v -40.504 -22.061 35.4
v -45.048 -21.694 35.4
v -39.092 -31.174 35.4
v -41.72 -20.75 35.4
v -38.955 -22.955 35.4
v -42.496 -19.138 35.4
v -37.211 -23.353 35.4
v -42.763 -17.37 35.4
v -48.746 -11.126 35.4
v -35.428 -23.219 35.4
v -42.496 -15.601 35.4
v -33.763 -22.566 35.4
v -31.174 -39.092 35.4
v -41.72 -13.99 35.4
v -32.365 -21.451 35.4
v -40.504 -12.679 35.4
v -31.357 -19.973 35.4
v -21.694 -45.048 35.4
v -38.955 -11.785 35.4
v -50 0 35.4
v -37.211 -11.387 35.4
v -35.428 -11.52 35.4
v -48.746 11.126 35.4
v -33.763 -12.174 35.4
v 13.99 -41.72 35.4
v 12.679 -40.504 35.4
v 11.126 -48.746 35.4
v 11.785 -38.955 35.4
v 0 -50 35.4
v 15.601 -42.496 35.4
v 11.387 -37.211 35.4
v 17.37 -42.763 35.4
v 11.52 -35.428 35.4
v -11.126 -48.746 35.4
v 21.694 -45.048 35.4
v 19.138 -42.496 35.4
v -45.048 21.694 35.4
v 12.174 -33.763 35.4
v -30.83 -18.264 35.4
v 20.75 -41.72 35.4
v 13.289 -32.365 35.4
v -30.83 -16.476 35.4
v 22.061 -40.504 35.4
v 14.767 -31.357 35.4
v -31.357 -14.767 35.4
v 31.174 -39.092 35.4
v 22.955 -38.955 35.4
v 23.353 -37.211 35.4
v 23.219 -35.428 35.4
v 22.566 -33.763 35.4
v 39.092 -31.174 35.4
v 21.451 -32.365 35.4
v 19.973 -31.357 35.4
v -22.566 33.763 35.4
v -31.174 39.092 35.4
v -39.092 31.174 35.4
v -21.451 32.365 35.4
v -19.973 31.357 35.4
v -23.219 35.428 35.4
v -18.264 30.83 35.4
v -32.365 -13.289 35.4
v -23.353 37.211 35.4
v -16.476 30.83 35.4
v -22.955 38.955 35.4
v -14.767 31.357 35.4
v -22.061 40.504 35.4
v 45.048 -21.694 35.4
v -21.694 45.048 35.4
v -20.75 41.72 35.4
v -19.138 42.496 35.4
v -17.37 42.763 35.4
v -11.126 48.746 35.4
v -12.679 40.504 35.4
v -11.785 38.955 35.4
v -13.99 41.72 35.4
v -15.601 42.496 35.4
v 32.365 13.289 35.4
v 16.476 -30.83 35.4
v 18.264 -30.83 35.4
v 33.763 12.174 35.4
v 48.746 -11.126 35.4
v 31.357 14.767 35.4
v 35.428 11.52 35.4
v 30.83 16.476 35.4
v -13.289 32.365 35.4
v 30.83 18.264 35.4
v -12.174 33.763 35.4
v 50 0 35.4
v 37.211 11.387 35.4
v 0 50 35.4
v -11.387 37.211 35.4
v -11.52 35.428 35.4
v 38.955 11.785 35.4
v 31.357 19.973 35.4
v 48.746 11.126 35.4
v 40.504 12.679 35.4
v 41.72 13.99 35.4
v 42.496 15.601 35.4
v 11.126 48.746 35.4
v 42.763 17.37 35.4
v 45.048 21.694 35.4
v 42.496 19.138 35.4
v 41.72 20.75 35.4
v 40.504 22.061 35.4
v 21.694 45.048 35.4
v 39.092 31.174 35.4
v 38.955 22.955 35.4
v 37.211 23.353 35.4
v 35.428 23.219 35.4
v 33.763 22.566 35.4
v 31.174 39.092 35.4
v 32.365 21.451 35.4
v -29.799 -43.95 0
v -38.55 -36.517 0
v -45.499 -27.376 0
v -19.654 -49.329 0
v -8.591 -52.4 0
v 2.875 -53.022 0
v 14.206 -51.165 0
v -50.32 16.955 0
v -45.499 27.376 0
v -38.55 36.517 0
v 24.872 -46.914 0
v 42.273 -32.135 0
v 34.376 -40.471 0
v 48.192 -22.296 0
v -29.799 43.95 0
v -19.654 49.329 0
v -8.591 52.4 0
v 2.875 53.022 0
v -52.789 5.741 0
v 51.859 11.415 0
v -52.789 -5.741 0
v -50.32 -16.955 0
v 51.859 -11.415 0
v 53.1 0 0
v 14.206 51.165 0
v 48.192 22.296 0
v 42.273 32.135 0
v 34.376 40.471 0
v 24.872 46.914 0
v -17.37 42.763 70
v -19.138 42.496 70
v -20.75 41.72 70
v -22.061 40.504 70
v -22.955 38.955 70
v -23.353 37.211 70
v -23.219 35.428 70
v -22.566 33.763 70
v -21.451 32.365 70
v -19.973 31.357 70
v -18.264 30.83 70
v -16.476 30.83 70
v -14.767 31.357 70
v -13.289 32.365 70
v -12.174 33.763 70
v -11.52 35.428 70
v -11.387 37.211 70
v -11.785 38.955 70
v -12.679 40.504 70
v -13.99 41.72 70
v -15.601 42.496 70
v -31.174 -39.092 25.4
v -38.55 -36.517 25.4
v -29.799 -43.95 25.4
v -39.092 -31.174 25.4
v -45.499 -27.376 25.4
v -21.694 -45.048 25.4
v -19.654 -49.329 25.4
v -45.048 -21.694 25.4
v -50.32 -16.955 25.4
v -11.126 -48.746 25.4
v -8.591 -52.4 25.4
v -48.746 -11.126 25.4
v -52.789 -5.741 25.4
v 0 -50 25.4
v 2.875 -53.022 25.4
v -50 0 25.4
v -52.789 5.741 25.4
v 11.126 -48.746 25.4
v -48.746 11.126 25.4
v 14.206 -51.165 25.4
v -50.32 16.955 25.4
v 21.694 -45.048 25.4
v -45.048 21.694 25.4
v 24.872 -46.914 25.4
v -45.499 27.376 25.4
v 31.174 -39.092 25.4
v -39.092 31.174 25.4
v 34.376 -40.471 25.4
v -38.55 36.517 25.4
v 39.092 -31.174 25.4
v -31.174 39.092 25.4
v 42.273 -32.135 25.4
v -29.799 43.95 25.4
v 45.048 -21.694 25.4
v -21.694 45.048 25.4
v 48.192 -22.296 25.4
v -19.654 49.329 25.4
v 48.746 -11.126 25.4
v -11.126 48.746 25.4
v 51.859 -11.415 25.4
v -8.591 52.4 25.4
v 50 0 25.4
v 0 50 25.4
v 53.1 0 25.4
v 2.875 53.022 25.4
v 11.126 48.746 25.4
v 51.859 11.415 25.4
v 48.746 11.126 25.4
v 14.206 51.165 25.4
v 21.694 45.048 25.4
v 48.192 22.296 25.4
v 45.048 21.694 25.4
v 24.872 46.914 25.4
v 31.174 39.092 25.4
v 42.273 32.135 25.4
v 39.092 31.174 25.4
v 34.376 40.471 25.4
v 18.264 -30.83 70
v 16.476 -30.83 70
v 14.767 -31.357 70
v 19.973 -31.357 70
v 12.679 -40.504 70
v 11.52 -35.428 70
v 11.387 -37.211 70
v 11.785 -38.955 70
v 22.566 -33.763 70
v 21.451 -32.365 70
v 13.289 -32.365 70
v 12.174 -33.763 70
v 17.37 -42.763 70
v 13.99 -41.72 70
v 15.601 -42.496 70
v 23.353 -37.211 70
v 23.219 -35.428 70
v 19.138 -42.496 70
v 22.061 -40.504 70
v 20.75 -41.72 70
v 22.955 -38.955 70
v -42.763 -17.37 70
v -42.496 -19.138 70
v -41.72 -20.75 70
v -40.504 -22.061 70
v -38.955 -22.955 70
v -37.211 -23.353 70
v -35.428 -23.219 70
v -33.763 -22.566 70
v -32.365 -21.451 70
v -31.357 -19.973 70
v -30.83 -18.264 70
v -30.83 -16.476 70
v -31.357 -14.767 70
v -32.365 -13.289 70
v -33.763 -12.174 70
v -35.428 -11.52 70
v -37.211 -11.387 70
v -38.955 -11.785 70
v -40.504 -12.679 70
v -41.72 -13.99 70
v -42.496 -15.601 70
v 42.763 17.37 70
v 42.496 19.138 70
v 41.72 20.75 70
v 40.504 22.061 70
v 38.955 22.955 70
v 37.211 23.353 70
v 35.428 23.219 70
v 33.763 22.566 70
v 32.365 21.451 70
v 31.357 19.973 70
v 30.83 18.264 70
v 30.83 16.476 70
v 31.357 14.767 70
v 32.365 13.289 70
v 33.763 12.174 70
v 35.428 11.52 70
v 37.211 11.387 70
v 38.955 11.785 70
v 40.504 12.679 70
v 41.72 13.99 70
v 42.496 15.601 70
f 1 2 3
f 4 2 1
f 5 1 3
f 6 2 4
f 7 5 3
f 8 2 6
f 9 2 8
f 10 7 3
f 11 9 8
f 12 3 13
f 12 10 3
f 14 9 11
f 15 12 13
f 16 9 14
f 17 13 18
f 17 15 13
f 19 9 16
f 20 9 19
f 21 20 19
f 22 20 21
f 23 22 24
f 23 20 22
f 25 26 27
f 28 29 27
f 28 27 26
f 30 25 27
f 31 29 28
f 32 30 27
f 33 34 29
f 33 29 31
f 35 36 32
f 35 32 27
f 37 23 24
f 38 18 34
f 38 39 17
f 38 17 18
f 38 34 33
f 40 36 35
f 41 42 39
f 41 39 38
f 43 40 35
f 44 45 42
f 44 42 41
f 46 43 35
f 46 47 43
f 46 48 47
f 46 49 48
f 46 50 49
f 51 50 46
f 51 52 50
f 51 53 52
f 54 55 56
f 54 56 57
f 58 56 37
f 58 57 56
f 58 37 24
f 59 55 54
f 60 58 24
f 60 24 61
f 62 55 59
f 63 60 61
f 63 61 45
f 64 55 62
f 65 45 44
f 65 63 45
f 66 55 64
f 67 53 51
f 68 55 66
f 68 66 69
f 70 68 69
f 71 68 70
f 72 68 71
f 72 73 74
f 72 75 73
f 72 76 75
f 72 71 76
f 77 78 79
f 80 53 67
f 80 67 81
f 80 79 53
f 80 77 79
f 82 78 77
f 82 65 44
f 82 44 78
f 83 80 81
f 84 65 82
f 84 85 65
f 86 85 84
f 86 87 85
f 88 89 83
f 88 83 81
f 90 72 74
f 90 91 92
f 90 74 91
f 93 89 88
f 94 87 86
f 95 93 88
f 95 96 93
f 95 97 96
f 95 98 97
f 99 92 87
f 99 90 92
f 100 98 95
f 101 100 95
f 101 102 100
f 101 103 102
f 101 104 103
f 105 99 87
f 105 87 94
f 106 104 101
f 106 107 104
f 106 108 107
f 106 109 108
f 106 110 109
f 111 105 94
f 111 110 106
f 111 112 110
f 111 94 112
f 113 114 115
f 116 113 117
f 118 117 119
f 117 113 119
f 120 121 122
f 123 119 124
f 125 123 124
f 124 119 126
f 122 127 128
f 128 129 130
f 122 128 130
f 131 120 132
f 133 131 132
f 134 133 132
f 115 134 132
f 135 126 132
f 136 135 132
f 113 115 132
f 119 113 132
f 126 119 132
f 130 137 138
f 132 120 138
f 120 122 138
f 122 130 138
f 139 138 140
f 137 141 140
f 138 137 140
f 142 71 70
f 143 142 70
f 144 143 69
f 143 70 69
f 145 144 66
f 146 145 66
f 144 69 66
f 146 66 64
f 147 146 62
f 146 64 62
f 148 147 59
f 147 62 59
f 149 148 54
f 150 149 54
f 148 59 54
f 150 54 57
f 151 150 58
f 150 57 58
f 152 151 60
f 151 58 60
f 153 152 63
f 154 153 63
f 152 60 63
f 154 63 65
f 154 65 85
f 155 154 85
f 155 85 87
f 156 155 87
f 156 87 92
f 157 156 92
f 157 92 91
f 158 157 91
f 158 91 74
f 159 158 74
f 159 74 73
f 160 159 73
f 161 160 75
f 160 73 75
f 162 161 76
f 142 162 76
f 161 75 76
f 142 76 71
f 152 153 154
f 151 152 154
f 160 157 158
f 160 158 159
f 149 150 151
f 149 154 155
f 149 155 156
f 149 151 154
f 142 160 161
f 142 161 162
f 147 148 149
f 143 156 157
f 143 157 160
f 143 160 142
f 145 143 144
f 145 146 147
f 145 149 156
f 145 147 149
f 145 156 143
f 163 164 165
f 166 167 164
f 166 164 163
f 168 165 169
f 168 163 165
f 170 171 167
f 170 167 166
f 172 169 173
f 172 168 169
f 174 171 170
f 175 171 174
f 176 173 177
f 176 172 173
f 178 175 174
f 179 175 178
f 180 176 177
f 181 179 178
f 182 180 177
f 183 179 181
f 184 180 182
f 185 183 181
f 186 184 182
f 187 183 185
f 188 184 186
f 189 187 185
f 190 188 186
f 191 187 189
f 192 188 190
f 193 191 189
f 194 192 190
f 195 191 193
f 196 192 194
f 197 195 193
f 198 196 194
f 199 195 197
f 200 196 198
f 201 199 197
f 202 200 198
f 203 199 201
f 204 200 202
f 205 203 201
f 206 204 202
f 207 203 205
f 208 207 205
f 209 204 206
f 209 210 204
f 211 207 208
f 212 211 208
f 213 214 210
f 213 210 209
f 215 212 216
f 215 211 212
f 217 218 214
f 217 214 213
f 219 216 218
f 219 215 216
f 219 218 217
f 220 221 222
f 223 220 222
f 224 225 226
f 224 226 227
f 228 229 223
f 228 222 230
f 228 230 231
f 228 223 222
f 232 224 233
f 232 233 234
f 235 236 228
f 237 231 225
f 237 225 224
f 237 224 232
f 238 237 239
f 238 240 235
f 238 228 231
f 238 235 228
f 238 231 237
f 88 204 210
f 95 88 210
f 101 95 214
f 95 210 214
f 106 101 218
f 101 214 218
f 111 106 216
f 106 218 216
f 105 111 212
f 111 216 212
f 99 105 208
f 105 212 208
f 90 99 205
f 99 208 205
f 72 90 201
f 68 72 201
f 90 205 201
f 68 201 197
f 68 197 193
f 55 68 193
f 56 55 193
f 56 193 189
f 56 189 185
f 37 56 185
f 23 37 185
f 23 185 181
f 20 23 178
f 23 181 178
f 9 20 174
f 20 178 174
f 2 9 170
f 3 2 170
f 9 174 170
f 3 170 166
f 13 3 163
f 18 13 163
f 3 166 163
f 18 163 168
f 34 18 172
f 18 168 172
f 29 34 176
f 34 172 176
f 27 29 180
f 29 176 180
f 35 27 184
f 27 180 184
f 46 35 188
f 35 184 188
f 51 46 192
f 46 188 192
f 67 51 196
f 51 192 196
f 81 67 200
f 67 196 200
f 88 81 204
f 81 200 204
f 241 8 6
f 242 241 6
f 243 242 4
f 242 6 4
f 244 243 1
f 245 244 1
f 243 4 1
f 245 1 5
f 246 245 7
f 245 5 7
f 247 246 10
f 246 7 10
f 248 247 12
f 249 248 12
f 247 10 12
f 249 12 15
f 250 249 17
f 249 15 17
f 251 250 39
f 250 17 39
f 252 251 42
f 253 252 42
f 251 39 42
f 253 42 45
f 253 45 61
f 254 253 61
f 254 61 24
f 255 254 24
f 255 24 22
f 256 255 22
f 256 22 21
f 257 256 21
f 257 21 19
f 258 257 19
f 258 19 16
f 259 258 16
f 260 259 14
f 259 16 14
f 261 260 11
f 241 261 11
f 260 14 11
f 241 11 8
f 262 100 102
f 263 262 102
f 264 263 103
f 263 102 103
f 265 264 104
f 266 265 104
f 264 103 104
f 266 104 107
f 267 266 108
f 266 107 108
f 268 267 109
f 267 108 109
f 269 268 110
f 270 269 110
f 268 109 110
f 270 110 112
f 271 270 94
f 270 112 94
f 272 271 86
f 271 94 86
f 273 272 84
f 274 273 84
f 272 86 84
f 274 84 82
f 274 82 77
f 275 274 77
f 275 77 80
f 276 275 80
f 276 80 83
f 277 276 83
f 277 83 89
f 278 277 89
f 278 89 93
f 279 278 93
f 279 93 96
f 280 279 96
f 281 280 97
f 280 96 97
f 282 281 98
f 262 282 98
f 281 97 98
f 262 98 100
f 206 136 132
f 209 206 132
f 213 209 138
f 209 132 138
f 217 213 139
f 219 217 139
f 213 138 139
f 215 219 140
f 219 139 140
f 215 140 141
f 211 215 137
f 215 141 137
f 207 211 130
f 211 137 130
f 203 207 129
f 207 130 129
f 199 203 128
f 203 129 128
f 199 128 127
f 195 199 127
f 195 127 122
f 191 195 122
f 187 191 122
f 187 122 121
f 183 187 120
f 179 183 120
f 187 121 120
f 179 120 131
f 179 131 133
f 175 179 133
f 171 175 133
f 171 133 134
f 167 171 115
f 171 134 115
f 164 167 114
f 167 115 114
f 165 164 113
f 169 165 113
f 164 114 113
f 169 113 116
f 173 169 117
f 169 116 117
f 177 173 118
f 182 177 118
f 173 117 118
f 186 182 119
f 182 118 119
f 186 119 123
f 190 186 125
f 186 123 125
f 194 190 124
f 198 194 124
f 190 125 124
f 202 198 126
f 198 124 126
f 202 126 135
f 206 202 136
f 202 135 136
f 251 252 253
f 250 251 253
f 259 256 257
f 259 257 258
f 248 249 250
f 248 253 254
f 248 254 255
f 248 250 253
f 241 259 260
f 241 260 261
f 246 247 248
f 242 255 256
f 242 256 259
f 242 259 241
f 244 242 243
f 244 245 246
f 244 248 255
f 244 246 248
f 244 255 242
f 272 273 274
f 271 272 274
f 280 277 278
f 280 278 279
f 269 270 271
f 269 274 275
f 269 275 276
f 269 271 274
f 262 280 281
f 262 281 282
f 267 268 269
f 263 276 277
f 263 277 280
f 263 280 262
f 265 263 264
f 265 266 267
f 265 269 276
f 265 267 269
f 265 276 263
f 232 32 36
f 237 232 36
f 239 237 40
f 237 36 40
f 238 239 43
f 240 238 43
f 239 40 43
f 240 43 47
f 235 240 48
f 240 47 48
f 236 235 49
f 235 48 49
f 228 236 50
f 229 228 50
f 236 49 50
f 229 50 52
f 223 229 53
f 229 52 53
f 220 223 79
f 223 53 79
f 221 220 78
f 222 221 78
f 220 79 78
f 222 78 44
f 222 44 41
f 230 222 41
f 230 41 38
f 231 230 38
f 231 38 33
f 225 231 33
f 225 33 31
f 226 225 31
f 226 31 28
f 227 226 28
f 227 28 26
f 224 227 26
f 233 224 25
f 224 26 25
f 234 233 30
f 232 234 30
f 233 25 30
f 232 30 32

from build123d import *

# Parameters (mm, degrees)
ESQUISSE1_R                  = 53.1
BOSS_EXTRU_1_DEPTH           = 25.4
ESQUISSE2_R                  = 50
BOSS_EXTRU_2_DEPTH           = 10
ESQUISSE3_R                  = 6
BOSS_EXTRU_3_DEPTH           = 34.6
R_P_TITION_CIRCULAIRE1_COUNT = 4


with BuildPart() as part:
    # Esquisse1 → Boss.-Extru.1 (new body)
    with BuildSketch(Plane.XY):
        Circle(ESQUISSE1_R)
    extrude(amount=BOSS_EXTRU_1_DEPTH)

    # Esquisse2 → Boss.-Extru.2 (add)
    with BuildSketch(Plane.XY.offset(25.4)):
        Circle(ESQUISSE2_R)
    extrude(amount=BOSS_EXTRU_2_DEPTH)

    # Esquisse3 → Boss.-Extru.3 (add)
    with BuildSketch(Plane.XY.offset(35.4)):
        with Locations((36.76305328, 17.369902519)):
            Circle(ESQUISSE3_R)
    boss_extru_3 = extrude(amount=BOSS_EXTRU_3_DEPTH)

    # Répétition circulaire1: Boss.-Extru.3 ×4 about axis
    r_p_tition_circulaire1_axis = Axis((0, 0, 25.4), (0, 0, -1))
    for i in range(1, R_P_TITION_CIRCULAIRE1_COUNT):
        add(boss_extru_3.rotate(r_p_tition_circulaire1_axis, i * 360 / R_P_TITION_CIRCULAIRE1_COUNT))


solid = part.part
